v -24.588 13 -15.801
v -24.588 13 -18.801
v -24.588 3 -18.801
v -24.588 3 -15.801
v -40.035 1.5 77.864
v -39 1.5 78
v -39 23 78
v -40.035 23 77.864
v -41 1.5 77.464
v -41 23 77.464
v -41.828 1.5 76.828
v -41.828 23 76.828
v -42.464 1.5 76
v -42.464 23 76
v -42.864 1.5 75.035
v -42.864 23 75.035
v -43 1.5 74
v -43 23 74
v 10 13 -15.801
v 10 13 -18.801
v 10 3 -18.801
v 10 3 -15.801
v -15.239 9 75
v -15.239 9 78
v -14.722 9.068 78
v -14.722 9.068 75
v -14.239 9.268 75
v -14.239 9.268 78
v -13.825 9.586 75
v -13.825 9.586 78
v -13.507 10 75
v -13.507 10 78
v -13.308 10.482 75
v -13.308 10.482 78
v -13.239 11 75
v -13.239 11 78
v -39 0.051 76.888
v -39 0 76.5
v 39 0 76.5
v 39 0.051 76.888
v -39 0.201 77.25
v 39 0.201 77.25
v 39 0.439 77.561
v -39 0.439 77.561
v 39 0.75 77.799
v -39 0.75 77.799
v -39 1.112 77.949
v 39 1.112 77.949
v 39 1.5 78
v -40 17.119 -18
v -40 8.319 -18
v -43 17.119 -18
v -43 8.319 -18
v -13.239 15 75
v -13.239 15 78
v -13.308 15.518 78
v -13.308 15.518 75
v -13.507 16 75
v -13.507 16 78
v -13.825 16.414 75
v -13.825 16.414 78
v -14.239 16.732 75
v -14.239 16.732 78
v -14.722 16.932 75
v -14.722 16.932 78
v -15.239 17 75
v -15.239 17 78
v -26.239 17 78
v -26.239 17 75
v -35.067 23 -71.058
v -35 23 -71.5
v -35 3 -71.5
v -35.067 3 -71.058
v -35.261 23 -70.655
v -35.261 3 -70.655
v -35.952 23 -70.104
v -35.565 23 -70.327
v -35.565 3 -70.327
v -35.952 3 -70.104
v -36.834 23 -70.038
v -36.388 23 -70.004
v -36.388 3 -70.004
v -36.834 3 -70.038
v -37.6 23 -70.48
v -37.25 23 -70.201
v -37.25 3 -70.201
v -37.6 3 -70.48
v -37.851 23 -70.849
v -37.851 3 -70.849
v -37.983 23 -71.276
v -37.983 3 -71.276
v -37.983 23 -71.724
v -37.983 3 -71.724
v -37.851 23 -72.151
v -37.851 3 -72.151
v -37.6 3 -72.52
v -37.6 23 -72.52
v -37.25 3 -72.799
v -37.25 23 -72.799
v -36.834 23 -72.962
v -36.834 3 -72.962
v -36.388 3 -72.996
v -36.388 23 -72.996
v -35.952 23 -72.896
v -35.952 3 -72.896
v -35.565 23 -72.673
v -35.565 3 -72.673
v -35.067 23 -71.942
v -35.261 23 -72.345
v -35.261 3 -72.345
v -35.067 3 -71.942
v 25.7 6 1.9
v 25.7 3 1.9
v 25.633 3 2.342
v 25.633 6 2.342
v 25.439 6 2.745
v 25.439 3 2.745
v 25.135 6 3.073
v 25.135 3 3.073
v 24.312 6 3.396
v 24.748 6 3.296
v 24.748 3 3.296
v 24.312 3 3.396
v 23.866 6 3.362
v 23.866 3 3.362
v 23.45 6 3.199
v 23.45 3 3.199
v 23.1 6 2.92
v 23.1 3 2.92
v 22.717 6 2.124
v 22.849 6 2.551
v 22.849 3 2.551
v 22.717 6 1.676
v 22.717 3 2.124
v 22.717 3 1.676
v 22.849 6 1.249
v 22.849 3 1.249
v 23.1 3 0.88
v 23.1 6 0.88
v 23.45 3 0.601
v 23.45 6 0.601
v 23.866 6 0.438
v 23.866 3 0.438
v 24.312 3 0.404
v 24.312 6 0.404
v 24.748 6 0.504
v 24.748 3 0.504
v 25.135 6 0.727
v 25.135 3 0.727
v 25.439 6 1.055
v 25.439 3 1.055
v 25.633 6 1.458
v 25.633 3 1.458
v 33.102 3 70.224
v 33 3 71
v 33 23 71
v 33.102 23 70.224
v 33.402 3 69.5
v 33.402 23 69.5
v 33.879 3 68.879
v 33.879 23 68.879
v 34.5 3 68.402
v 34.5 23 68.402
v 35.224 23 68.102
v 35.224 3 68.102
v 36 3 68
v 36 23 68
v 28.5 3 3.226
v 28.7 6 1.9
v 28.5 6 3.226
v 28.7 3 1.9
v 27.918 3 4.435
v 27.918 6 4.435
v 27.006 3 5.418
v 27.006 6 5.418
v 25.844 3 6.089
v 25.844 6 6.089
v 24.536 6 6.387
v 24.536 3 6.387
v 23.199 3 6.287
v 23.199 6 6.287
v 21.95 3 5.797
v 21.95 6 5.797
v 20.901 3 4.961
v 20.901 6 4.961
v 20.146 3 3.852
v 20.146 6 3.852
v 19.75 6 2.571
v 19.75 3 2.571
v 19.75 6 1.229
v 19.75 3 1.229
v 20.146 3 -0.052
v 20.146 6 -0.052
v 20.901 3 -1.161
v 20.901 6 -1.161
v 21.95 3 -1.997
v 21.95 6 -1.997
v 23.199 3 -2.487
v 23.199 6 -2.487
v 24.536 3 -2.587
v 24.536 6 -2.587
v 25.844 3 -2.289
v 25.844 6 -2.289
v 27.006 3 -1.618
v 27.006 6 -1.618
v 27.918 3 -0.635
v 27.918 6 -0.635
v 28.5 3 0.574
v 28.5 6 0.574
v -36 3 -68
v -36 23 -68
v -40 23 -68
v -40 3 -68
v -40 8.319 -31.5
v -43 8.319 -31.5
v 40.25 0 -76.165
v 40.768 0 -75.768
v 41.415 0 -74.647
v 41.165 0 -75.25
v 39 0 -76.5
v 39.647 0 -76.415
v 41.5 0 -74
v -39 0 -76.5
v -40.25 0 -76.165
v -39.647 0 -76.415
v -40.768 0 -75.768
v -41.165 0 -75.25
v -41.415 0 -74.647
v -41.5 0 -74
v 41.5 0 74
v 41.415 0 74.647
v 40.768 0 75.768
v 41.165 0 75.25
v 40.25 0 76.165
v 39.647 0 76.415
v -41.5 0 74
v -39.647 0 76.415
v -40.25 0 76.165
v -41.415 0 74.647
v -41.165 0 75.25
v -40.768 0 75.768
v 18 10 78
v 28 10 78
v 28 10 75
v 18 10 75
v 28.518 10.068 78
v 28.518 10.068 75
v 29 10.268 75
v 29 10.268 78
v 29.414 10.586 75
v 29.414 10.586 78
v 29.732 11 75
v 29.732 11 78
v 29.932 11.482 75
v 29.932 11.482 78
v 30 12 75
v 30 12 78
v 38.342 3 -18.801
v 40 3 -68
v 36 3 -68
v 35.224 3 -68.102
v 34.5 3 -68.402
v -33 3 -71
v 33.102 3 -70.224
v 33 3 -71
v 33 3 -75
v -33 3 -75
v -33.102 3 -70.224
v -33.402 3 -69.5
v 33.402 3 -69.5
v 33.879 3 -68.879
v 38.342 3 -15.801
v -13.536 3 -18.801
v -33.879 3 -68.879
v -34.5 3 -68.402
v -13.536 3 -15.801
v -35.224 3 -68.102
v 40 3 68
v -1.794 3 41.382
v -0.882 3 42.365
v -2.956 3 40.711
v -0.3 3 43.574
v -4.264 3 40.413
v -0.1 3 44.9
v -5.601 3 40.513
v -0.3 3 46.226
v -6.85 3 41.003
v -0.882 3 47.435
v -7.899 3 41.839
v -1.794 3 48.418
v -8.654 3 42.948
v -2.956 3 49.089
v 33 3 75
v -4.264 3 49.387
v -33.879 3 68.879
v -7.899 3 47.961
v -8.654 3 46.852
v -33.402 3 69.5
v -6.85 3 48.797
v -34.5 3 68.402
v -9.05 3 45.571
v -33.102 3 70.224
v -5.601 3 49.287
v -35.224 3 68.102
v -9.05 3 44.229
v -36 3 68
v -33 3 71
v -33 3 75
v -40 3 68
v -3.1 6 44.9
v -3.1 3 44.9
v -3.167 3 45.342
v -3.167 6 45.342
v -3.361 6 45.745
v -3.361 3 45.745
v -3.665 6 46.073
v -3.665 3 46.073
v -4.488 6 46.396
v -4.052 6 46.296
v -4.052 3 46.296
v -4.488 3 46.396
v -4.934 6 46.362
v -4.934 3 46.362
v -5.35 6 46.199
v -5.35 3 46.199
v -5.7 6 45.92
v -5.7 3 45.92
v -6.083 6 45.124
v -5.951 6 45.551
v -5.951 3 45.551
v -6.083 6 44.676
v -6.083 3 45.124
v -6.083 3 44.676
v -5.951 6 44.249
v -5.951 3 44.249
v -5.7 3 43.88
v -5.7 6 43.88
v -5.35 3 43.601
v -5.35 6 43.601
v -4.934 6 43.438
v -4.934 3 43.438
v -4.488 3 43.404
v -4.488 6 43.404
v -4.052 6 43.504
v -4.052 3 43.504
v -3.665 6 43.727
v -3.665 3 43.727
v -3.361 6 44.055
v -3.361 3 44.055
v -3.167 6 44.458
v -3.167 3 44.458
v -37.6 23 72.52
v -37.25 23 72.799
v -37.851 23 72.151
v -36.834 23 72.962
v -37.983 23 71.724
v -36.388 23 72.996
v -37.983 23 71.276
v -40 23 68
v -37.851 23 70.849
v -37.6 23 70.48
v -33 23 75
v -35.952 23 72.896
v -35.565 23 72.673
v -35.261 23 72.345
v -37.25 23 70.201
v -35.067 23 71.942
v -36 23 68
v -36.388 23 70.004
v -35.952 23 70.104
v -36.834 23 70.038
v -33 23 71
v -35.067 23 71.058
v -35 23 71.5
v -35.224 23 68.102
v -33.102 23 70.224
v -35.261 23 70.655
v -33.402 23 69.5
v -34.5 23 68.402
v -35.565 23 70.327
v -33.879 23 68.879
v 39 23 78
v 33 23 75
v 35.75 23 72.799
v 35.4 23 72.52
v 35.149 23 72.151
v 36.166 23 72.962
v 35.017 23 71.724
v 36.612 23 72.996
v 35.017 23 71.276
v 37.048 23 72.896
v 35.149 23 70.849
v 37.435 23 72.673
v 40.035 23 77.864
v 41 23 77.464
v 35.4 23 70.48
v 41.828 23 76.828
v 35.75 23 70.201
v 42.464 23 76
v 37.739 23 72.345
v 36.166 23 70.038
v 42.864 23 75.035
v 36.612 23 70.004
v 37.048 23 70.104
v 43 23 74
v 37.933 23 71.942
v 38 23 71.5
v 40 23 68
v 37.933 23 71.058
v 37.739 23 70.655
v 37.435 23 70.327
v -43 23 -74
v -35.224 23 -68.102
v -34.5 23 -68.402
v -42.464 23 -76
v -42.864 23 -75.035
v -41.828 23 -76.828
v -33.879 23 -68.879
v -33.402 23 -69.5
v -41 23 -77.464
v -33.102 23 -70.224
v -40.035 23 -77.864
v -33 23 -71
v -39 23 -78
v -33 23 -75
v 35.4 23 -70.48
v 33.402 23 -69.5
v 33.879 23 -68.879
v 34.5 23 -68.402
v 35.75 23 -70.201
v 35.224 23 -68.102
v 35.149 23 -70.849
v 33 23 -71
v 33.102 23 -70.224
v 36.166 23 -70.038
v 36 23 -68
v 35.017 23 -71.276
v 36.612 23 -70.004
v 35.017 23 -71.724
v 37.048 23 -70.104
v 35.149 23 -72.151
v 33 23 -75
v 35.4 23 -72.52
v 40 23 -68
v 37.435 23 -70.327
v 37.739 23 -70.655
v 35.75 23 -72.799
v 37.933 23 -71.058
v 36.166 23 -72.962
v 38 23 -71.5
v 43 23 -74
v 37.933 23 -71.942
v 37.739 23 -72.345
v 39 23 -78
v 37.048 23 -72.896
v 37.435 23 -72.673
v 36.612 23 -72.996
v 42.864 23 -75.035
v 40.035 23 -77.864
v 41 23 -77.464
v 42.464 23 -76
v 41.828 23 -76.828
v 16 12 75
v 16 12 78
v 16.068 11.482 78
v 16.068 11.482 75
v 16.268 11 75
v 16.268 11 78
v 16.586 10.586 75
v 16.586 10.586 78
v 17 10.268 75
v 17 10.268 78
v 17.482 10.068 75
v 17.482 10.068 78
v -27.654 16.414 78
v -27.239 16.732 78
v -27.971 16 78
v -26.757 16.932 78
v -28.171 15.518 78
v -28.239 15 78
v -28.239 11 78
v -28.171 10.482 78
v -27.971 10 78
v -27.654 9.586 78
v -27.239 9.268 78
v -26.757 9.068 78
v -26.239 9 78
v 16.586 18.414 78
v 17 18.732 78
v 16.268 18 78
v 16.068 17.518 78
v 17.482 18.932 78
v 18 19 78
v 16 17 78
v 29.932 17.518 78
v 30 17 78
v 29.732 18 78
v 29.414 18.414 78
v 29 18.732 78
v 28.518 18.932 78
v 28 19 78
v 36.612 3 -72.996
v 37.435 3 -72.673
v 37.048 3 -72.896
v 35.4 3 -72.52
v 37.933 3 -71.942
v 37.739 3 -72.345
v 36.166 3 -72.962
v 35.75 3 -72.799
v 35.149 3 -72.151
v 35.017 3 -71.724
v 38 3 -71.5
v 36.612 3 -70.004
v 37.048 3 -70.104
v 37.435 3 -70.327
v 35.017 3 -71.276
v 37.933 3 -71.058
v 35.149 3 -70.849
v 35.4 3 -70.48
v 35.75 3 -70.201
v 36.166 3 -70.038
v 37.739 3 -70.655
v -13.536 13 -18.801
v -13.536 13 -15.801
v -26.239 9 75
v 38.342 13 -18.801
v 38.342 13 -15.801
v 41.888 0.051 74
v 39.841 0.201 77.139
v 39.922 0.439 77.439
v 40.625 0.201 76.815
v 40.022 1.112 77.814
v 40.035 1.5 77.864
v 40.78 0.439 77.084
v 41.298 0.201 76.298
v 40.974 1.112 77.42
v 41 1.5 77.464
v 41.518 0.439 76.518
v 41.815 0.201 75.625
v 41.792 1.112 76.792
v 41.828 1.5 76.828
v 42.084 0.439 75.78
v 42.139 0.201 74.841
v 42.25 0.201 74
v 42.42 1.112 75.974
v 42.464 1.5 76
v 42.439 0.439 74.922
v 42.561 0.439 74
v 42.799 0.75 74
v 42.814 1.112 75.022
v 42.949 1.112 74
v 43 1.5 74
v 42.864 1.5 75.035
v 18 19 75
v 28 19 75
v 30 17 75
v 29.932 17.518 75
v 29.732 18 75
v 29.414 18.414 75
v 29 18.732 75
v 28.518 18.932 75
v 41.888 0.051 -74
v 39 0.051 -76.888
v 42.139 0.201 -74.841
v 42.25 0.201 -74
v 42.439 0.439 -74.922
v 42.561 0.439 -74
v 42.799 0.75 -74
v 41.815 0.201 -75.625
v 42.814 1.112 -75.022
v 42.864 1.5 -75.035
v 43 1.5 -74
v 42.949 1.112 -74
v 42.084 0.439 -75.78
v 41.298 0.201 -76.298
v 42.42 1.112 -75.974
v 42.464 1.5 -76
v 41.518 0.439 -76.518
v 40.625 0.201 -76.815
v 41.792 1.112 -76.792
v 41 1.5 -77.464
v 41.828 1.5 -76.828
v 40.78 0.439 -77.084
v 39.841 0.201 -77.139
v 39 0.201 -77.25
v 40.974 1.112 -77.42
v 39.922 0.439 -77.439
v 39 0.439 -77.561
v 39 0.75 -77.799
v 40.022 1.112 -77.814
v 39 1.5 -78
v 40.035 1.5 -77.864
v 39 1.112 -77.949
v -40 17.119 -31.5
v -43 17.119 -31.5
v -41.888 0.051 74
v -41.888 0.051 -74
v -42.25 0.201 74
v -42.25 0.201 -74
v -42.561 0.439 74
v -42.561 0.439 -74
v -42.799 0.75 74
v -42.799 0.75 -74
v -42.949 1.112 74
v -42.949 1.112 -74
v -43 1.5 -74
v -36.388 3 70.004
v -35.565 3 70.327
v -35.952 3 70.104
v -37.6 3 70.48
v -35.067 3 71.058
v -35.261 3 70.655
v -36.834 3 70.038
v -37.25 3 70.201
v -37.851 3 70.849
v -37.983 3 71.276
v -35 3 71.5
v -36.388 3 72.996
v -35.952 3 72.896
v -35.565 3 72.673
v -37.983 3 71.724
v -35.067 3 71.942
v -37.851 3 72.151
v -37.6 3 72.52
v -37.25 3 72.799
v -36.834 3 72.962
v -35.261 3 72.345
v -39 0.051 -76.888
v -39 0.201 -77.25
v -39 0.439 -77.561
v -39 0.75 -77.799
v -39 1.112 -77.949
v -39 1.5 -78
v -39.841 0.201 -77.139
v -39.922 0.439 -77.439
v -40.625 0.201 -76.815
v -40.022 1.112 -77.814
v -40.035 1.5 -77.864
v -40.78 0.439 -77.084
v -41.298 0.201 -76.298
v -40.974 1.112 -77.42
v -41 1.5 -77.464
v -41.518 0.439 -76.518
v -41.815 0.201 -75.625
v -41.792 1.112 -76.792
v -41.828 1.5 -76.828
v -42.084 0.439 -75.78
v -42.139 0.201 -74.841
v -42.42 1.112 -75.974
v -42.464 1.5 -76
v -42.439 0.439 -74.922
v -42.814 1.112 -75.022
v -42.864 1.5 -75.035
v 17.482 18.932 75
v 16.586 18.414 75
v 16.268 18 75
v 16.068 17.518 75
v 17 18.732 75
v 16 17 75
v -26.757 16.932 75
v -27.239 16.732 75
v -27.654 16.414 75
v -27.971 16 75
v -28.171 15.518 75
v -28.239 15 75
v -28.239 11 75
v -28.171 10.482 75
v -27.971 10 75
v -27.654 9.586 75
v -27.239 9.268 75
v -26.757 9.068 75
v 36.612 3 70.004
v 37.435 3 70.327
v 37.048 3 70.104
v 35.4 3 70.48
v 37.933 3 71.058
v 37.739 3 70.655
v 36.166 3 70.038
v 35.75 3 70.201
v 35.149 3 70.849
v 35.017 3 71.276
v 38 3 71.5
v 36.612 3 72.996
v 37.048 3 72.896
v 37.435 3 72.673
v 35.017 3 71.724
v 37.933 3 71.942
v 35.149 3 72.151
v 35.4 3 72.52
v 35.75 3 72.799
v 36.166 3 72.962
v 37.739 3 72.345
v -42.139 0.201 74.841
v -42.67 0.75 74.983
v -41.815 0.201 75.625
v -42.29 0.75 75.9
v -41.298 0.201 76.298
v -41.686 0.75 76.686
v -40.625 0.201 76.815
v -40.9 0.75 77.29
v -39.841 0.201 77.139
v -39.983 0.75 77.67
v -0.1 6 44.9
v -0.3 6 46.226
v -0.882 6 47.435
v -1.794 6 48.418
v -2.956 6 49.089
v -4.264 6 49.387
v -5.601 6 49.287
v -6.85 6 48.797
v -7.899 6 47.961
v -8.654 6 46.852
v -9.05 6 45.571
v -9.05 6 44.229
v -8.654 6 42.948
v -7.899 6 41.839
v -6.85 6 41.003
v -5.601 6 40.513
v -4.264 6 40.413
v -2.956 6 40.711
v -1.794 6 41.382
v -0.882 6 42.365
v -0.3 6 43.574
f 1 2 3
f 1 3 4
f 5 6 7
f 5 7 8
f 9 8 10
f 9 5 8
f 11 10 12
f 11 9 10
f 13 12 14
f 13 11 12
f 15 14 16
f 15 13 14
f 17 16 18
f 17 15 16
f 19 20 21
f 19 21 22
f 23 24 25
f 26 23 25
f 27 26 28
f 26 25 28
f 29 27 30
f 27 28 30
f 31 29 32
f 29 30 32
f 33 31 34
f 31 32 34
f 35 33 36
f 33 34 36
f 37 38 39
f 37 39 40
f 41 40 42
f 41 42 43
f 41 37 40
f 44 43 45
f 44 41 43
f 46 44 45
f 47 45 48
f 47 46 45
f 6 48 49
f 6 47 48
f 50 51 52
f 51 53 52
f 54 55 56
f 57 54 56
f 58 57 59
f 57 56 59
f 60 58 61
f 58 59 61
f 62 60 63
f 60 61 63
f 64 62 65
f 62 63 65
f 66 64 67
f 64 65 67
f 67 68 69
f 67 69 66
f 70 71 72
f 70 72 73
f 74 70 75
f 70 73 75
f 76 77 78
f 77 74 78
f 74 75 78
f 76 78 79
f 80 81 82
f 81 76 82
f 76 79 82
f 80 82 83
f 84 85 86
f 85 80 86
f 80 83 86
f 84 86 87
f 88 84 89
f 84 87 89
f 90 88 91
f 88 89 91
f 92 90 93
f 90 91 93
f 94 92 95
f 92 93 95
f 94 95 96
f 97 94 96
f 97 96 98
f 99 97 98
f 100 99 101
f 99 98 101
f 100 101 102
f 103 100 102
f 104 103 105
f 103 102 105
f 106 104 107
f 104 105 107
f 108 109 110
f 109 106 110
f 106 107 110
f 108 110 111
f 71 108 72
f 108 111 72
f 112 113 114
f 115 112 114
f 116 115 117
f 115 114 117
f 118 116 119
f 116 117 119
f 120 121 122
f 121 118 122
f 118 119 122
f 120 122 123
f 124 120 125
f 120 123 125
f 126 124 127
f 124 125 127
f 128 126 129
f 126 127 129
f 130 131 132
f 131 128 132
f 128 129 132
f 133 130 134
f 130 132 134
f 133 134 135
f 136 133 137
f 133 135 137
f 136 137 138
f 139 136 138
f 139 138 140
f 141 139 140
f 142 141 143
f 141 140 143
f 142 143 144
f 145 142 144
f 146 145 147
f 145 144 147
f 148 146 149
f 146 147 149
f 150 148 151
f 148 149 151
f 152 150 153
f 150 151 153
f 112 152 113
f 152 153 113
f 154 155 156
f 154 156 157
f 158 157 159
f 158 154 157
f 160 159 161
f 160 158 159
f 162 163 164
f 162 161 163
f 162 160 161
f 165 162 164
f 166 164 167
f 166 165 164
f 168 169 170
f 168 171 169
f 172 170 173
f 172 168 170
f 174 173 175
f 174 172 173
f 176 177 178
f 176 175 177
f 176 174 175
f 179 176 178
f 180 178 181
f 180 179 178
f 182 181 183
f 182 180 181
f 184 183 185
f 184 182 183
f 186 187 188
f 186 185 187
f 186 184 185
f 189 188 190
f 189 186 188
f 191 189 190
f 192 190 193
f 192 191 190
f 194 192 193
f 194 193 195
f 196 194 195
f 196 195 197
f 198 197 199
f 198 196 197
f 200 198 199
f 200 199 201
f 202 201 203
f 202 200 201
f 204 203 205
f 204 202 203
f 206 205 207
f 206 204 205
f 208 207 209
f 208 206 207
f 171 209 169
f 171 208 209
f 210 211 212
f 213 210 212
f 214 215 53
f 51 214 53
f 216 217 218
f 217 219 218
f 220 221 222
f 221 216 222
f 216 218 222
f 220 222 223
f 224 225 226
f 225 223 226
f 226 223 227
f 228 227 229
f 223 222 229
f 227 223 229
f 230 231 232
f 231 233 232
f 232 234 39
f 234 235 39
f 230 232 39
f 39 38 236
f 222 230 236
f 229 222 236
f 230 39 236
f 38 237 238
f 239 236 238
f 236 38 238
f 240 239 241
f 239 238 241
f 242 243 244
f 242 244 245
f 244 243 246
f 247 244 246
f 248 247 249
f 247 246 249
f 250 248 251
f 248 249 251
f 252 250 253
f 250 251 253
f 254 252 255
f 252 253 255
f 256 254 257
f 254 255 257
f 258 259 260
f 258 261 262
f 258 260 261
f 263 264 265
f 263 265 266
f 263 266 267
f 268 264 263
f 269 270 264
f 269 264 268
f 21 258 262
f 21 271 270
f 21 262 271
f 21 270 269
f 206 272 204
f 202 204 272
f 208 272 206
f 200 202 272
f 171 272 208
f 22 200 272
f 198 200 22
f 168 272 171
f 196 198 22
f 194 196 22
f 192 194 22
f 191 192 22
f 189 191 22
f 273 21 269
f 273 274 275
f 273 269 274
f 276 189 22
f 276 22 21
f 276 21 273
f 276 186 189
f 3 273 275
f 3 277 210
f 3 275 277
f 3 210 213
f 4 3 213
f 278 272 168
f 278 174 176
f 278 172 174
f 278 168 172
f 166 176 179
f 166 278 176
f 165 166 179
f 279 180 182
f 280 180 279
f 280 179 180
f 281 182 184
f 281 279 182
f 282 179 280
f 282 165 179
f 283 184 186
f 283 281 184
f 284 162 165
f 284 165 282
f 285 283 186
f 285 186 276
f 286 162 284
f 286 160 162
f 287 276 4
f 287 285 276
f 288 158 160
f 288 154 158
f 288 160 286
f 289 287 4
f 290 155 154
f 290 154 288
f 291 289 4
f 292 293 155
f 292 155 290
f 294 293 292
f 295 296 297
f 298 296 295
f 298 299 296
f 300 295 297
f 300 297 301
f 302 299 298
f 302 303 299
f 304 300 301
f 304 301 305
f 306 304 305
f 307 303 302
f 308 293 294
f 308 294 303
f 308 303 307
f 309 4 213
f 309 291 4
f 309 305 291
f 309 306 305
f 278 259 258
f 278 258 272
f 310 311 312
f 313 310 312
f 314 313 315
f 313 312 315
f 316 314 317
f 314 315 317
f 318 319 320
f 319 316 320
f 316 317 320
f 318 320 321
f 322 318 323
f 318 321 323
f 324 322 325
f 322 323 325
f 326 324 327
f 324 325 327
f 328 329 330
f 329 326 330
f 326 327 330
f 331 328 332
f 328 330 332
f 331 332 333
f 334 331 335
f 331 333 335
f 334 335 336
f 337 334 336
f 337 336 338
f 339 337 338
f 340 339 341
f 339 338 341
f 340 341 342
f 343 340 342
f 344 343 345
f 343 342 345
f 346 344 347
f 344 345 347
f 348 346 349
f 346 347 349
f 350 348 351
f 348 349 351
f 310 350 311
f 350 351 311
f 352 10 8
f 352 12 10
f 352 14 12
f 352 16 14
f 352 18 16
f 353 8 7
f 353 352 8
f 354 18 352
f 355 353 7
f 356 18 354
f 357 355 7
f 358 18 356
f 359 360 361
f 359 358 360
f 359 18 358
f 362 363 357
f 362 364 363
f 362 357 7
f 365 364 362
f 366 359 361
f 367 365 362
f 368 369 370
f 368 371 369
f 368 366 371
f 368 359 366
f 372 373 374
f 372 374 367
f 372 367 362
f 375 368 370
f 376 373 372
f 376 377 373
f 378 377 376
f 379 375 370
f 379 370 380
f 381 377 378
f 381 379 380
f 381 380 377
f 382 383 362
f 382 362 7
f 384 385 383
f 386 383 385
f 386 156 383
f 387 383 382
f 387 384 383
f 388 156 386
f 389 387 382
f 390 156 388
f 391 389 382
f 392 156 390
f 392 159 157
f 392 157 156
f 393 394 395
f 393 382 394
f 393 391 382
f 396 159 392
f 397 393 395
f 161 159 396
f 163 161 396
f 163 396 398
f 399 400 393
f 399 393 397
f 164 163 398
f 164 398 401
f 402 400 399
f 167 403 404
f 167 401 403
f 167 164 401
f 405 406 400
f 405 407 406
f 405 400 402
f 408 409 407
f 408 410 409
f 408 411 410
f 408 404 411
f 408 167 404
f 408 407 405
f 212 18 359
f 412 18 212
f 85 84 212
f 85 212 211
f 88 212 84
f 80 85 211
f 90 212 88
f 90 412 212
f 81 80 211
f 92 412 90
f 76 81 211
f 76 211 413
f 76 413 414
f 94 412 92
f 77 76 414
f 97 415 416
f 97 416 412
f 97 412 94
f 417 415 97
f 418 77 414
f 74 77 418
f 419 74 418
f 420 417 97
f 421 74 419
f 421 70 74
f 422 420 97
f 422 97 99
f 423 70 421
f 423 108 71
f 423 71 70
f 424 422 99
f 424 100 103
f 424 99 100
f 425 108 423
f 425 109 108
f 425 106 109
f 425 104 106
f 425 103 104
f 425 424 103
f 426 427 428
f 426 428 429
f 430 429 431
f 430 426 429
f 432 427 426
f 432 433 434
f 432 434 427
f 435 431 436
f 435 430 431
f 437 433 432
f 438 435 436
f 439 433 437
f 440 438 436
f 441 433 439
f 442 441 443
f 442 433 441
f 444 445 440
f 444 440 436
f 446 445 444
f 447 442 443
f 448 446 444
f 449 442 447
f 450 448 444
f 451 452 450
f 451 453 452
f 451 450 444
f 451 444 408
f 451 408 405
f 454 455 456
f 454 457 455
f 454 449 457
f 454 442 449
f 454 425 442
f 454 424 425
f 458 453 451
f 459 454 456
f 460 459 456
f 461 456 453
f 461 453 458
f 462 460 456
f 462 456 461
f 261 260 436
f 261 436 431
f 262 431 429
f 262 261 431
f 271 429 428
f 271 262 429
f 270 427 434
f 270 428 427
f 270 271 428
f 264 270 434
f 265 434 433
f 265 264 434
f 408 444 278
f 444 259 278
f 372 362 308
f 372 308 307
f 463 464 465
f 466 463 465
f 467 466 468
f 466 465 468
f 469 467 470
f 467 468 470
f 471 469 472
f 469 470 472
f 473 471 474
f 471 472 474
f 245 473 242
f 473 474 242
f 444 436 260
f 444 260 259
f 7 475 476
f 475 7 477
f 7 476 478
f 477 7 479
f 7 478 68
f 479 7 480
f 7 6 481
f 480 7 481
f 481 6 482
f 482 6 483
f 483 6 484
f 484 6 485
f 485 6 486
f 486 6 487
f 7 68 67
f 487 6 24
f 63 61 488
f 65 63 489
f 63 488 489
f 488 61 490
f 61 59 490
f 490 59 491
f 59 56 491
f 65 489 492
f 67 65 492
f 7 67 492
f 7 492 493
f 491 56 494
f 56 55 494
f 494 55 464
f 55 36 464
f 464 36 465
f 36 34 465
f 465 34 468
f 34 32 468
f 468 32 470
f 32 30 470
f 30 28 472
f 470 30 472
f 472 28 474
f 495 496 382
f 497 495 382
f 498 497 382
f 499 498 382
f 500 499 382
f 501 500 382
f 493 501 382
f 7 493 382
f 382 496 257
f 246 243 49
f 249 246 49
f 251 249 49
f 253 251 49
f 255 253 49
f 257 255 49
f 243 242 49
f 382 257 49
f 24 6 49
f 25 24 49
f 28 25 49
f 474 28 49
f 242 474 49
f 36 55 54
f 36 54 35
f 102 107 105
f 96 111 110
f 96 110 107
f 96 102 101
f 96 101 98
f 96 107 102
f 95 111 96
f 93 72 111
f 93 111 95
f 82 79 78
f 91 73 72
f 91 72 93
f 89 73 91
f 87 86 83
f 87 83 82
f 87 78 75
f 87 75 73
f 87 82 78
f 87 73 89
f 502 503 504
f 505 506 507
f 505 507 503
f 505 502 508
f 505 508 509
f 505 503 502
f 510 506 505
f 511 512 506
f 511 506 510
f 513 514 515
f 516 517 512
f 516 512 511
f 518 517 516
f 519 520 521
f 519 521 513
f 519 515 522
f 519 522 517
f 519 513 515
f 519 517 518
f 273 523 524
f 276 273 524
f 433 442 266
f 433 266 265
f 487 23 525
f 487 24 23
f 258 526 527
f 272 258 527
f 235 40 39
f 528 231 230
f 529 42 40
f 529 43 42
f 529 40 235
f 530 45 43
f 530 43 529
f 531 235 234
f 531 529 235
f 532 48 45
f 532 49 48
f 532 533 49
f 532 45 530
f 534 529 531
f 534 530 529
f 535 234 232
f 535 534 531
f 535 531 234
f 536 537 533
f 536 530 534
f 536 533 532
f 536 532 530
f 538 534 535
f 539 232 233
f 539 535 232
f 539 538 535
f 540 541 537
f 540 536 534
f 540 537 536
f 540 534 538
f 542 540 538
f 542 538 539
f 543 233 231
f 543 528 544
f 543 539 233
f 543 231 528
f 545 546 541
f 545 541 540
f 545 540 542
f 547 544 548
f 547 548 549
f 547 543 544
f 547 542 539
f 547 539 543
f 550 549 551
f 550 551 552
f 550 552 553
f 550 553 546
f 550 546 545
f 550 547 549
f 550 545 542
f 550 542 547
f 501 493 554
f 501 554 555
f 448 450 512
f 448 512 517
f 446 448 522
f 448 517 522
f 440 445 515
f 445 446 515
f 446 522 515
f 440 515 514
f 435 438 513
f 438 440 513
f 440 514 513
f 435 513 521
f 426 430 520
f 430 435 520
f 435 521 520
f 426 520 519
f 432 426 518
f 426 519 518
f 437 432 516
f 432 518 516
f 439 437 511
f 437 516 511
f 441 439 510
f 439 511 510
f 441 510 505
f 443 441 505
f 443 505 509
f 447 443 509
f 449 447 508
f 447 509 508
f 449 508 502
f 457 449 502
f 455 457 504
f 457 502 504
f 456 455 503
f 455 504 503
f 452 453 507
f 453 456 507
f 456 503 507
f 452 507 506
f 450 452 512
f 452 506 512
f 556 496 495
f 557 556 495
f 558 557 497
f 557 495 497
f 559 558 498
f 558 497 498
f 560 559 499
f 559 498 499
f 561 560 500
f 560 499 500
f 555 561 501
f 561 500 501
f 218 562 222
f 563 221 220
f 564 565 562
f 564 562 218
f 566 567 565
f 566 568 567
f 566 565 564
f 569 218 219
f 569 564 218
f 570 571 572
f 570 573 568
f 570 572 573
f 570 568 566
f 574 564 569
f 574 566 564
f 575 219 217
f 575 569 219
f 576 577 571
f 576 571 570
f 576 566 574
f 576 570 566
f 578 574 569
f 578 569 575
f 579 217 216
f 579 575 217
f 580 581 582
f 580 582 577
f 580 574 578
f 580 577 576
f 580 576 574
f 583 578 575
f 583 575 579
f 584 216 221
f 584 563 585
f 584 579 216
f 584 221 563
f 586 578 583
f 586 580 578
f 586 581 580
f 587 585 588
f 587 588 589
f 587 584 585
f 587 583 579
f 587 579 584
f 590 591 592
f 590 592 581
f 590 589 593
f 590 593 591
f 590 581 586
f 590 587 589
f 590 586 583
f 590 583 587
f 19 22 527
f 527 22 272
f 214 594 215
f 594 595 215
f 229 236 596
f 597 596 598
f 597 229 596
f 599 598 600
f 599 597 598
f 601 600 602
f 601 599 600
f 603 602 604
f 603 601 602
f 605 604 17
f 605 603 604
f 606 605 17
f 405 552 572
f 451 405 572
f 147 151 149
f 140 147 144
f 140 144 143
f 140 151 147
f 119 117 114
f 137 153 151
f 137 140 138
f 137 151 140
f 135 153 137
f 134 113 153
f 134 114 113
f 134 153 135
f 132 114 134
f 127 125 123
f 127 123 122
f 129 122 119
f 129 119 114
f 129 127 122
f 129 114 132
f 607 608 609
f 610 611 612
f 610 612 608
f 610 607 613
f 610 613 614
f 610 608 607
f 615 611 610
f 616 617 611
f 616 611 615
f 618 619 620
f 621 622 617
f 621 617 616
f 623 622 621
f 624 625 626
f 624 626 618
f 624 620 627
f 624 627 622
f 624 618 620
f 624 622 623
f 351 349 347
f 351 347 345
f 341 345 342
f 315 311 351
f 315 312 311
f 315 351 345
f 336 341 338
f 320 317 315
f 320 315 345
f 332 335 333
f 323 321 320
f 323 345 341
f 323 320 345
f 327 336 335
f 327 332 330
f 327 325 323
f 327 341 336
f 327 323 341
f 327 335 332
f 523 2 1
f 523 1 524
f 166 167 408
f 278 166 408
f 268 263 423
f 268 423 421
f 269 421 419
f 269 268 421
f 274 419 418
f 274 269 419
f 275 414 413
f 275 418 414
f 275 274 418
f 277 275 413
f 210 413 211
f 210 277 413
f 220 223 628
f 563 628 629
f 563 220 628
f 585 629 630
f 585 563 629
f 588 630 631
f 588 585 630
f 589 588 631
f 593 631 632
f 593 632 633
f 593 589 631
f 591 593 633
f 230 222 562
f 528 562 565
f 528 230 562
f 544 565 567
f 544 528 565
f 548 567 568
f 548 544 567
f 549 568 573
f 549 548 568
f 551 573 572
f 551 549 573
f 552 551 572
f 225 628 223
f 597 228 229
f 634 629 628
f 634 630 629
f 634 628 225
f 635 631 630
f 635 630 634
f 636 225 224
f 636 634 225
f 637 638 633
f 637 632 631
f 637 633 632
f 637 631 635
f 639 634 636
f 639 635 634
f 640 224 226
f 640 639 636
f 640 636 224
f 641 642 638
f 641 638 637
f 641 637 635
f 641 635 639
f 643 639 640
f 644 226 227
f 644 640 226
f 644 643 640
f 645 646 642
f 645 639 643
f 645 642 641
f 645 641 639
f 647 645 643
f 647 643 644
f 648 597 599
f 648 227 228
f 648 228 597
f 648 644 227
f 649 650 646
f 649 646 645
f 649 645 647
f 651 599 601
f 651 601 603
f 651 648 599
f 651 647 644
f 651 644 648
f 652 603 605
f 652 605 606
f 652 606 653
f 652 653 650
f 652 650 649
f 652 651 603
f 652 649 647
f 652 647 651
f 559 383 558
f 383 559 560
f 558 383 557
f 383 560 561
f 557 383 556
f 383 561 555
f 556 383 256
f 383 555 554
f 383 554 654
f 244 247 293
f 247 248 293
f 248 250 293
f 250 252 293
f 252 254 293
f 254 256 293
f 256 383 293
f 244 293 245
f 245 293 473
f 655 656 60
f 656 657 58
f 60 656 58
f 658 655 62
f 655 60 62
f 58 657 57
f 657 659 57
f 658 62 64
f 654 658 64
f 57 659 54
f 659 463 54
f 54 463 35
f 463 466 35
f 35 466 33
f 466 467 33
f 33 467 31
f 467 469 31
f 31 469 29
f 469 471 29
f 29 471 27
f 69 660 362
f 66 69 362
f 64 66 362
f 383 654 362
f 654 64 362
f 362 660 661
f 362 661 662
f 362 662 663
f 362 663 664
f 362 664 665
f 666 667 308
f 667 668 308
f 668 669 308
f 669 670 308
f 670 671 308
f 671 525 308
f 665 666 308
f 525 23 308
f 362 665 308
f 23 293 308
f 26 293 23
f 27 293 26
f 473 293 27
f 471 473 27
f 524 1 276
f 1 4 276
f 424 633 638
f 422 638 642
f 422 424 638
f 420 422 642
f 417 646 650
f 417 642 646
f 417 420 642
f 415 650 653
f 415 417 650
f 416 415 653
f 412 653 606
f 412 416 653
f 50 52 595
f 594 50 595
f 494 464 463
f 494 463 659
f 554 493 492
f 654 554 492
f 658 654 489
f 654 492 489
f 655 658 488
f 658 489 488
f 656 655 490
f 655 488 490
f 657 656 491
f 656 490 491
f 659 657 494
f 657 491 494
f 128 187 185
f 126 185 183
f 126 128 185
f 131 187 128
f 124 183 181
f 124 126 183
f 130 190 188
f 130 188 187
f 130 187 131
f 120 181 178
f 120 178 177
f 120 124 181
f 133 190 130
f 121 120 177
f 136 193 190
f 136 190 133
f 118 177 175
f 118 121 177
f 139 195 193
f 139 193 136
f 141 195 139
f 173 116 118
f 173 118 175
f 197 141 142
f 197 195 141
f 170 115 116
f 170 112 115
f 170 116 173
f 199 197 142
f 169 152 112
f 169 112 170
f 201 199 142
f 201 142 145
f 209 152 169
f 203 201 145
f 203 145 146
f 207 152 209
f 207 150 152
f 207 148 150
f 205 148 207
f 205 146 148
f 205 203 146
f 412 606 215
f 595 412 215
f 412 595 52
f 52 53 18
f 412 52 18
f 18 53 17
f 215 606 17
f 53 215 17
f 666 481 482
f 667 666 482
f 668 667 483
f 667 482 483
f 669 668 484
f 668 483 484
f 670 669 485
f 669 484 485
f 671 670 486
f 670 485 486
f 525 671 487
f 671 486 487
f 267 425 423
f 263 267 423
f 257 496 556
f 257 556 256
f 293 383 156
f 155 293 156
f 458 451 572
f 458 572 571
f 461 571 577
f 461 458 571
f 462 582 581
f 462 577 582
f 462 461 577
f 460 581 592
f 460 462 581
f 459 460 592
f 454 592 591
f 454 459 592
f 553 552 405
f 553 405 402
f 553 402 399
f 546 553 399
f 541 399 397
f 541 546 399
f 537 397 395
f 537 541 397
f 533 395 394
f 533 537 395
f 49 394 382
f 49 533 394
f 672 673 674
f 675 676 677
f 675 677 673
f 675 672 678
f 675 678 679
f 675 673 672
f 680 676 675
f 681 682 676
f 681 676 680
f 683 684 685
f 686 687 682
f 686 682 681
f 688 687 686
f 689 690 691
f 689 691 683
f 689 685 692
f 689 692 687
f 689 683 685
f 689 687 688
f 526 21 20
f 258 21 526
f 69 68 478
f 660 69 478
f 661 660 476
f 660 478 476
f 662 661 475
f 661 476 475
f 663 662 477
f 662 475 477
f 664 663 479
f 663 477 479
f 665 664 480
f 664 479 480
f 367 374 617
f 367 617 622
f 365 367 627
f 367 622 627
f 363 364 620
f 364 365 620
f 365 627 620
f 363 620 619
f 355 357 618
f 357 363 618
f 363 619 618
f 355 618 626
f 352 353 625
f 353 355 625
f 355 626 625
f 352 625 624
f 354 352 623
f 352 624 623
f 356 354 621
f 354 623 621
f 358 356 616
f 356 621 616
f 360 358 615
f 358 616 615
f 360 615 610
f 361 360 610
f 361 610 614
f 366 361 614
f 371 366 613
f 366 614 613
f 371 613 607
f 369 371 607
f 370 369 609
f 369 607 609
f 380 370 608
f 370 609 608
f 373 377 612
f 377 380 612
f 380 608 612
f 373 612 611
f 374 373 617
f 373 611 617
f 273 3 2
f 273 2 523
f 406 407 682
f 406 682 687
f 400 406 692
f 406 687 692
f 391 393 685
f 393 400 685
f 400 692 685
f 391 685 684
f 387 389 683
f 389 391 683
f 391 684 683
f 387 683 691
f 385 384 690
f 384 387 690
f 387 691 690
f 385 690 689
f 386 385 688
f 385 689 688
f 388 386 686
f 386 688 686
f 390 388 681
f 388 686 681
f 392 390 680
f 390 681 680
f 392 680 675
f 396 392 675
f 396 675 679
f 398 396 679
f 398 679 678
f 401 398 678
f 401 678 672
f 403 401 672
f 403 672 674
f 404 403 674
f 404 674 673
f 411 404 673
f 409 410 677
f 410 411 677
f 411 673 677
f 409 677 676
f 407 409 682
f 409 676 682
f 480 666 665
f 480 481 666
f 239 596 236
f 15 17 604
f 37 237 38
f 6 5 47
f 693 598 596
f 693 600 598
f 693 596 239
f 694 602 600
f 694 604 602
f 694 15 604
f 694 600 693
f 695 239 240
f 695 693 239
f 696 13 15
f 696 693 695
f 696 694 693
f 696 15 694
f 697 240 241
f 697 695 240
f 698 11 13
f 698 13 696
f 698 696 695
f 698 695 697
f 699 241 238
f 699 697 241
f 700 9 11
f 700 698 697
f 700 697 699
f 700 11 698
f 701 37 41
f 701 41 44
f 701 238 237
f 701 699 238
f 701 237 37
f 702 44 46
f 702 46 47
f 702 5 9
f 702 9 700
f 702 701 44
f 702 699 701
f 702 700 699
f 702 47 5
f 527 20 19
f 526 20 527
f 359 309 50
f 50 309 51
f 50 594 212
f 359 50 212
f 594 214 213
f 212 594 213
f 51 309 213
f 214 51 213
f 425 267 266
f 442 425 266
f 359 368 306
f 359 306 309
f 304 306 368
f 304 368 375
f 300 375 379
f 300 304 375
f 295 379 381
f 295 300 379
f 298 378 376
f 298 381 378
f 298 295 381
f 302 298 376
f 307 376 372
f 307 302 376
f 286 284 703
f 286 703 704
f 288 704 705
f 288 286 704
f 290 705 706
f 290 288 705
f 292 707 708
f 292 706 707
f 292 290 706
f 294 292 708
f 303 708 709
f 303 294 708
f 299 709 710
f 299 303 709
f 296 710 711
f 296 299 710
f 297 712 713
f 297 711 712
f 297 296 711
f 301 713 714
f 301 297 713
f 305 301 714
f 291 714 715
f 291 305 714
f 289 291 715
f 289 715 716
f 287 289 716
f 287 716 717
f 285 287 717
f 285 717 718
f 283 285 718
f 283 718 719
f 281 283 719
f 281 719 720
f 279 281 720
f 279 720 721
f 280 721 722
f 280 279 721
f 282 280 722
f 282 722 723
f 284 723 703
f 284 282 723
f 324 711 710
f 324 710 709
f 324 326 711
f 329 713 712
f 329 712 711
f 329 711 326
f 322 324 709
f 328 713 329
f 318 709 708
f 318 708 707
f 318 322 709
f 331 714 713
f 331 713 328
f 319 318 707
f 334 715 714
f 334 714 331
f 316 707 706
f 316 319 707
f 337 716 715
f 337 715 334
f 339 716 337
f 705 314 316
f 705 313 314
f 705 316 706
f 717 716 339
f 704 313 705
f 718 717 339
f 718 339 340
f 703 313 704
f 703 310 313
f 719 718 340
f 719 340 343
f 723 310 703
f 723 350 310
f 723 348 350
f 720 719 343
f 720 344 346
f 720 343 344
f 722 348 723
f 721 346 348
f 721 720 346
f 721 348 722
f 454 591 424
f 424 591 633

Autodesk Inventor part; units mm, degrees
ref_plane "YZ Plane" through (0, 0, 0) normal (1, 0, 0) x (0, 1, 0)
ref_plane "XZ Plane" through (0, 0, 0) normal (0, 1, 0) x (-1, 0, 0)
ref_plane "XY Plane" through (0, 0, 0) normal (0, 0, 1) x (1, 0, 0)
sketch "Sketch1" plane through (0, 0, 0) normal (0, 1, 0) x (-1, 0, 0)
  line L0 (-43, -78) -> (43, -78)
  line L1 (43, -78) -> (43, 78)
  line L2 (43, 78) -> (-43, 78)
  line L3 (-43, 78) -> (-43, -78)
  point P0 (0, 0)
extrude "Extrusion1" add sketch "Sketch1" along normal blind 3
sketch "Sketch2" plane through (0, 3, 0) normal (0, 1, 0) x (1, 0, 0)
  line L0 (-33, 75) -> (33, 75)
  line L1 (40, 68) -> (40, -68)
  line L2 (33, -75) -> (-33, -75)
  line L3 (-40, -68) -> (-40, 68)
  line L4 (-40, 75) -> (40, -75) construction
  line L5 (40, 75) -> (-40, -75) construction
  line L6 (43, 78) -> (-43, 78)
  line L7 (-43, 78) -> (-43, -78)
  line L8 (-43, -78) -> (43, -78)
  line L9 (43, -78) -> (43, 78)
  line L10 (-40, 75) -> (-33, 75)
  line L11 (-33, 75) -> (-33, 71)
  line L12 (-36, 68) -> (-40, 68)
  line L13 (-40, 68) -> (-40, 75)
  circle A0 centre (-36.5, 71.5) radius 1.5
  arc A1 (-36, 68) -> (-33, 71) centre (-36, 71) ccw
  line L14 (40, 75) -> (-40, -75) construction
  line L15 (33, 75) -> (33, 71)
  line L16 (36, 68) -> (40, 68)
  circle A2 centre (36.5, 71.5) radius 1.5
  arc A3 (33, 71) -> (36, 68) centre (36, 71) ccw
  line L17 (-40, -75) -> (40, 75) construction
  line L18 (-33, -75) -> (-33, -71)
  line L19 (-36, -68) -> (-40, -68)
  circle A4 centre (-36.5, -71.5) radius 1.5
  arc A5 (-33, -71) -> (-36, -68) centre (-36, -71) ccw
  line L20 (36, -68) -> (40, -68)
  arc A6 (36, -68) -> (33, -71) centre (36, -71) ccw
  circle A7 centre (36.5, -71.5) radius 1.5
  line L21 (33, -75) -> (33, -71)
  point P0 (0, 0)
  point P1 (-33, 68)
  point P2 (33, 68)
  point P3 (-33, -68)
  dimension "d5" = 80
  dimension "d6" = 150
  dimension "d7" = 3
  dimension "d42" = 7
  dimension "d43" = 7
  dimension "d45" = 3
  dimension "d46" = 3
extrude "Extrusion2" add sketch "Sketch2" along normal blind 20 contours L11 A1 L12 L13 L10 | L9 L8 L7 L6
fillet "Fillet1" radius 4 4 edges at (-43, 11.5, 78) (43, 11.5, 78) (43, 11.5, -78) (-43, 11.5, -78)
sketch "Sketch3" plane through (0, 3, 0) normal (0, 1, 0) x (1, 0, 0)
  line L0 (-24.5882, 18.801) -> (-24.5882, 15.801)
  line L1 (10, 18.801) -> (10, 15.801)
  line L2 (-24.5882, 18.801) -> (-13.5365, 18.801)
  line L3 (-24.5882, 15.801) -> (-13.5365, 15.801)
  line L4 (10, 18.801) -> (30, 18.801)
  line L5 (10, 15.801) -> (30, 15.801)
  line L6 (30, 18.801) -> (38.3417, 18.801)
  line L7 (30, 15.801) -> (38.3417, 15.801)
  line L8 (38.3417, 18.801) -> (38.3417, 15.801)
  line L9 (-13.5365, 18.801) -> (-13.5365, 15.801)
  point P0 (0, 0)
extrude "Extrusion3" add sketch "Sketch3" along normal blind 10
sketch "Sketch6" plane through (0, 3, 0) normal (0, 1, 0) x (1, 0, 0)
  line L0 (-33, -75) -> (33, -75) projected
  line L1 (-40, 68) -> (-40, -68) projected
  line L2 (0, -75) -> (0, -69.5874)
  circle A0 centre (-4.6, -44.9) radius 1.5
  circle A1 centre (-4.6, -44.9) radius 4.5
  circle A2 centre (24.2, -1.9) radius 1.5
  circle A3 centre (24.2, -1.9) radius 4.5
  point P0 (0, 0)
extrude "Extrusion5" add sketch "Sketch6" along normal blind 3
sketch "Sketch7" plane through (-43, 0, -74) normal (-1, 0, 0) x (0, 0, 1)
  line L0 (0, 23) -> (0, 0) projected
  line L1 (42.5, 8.3188) -> (56, 8.3188)
  line L2 (56, 8.3188) -> (56, 17.1188)
  line L3 (56, 17.1188) -> (42.5, 17.1188)
  line L4 (42.5, 17.1188) -> (42.5, 8.3188)
  line L5 (42.5, 8.3188) -> (56, 17.1188) construction
  line L6 (56, 8.3188) -> (42.5, 17.1188) construction
  point P0 (74, 0)
  dimension "d58" = 13.5
  dimension "d59" = 8.8
extrude "Extrusion6" cut sketch "Sketch7" against normal blind 3
sketch "Sketch8" plane through (-39, 0, 78) normal (0, 0, 1) x (1, 0, 0)
  line L0 (12.7606, 17) -> (23.7606, 17)
  line L1 (25.7606, 15) -> (25.7606, 11)
  line L2 (23.7606, 9) -> (12.7606, 9)
  line L3 (10.7606, 11) -> (10.7606, 15)
  arc A0 (12.7606, 17) -> (10.7606, 15) centre (12.7606, 15) ccw
  arc A1 (25.7606, 15) -> (23.7606, 17) centre (23.7606, 15) ccw
  arc A2 (23.7606, 9) -> (25.7606, 11) centre (23.7606, 11) ccw
  arc A3 (10.7606, 11) -> (12.7606, 9) centre (12.7606, 11) ccw
  line L4 (82, 23) -> (82, 0) projected
  line L5 (78, 0) -> (0, 0) projected
  line L6 (71.3066, 0) -> (87.3066, 0) construction
  line L7 (72, 3) -> (72, 23) projected
  line L8 (72, 11.5) -> (81, 11.5) construction
  line L9 (49, 13) -> (77.3417, 13) projected
  line L10 (57, 19) -> (67, 19)
  line L11 (69, 17) -> (69, 12)
  line L12 (67, 10) -> (57, 10)
  line L13 (55, 12) -> (55, 17)
  line L14 (55, 19) -> (69, 10) construction
  line L15 (69, 19) -> (55, 10) construction
  line L16 (0, 23) -> (78, 23) projected
  arc A4 (57, 19) -> (55, 17) centre (57, 17) ccw
  arc A5 (55, 12) -> (57, 10) centre (57, 12) ccw
  arc A6 (69, 17) -> (67, 19) centre (67, 17) ccw
  arc A7 (67, 10) -> (69, 12) centre (67, 12) ccw
  point P0 (39, 0)
  point P1 (25.7606, 9)
  point P2 (25.7606, 17)
  point P3 (10.7606, 9)
  point P4 (69, 13)
  dimension "d68" = 15
  dimension "d69" = 8
  dimension "d70" = 2
  dimension "d98" = 14
  dimension "d99" = 4
  dimension "d100" = 9
  dimension "d101" = 2
  dimension "d102" = 2
  dimension "d103" = 2
  dimension "d104" = 2
  dimension "d105" = 13
  dimension "d106" = 6
extrude "Extrusion7" cut sketch "Sketch8" against normal blind 3
fillet "Fillet3" radius 1.5 8 edges at (-41.8284, 0, 76.8284) (0, 0, 78) (41.8284, 0, 76.8284) (43, 0, 0) (41.8284, 0, -76.8284) (0, 0, -78) (-41.8284, 0, -76.8284) (-43, 0, 0)
properties part number "CASING NEW"
